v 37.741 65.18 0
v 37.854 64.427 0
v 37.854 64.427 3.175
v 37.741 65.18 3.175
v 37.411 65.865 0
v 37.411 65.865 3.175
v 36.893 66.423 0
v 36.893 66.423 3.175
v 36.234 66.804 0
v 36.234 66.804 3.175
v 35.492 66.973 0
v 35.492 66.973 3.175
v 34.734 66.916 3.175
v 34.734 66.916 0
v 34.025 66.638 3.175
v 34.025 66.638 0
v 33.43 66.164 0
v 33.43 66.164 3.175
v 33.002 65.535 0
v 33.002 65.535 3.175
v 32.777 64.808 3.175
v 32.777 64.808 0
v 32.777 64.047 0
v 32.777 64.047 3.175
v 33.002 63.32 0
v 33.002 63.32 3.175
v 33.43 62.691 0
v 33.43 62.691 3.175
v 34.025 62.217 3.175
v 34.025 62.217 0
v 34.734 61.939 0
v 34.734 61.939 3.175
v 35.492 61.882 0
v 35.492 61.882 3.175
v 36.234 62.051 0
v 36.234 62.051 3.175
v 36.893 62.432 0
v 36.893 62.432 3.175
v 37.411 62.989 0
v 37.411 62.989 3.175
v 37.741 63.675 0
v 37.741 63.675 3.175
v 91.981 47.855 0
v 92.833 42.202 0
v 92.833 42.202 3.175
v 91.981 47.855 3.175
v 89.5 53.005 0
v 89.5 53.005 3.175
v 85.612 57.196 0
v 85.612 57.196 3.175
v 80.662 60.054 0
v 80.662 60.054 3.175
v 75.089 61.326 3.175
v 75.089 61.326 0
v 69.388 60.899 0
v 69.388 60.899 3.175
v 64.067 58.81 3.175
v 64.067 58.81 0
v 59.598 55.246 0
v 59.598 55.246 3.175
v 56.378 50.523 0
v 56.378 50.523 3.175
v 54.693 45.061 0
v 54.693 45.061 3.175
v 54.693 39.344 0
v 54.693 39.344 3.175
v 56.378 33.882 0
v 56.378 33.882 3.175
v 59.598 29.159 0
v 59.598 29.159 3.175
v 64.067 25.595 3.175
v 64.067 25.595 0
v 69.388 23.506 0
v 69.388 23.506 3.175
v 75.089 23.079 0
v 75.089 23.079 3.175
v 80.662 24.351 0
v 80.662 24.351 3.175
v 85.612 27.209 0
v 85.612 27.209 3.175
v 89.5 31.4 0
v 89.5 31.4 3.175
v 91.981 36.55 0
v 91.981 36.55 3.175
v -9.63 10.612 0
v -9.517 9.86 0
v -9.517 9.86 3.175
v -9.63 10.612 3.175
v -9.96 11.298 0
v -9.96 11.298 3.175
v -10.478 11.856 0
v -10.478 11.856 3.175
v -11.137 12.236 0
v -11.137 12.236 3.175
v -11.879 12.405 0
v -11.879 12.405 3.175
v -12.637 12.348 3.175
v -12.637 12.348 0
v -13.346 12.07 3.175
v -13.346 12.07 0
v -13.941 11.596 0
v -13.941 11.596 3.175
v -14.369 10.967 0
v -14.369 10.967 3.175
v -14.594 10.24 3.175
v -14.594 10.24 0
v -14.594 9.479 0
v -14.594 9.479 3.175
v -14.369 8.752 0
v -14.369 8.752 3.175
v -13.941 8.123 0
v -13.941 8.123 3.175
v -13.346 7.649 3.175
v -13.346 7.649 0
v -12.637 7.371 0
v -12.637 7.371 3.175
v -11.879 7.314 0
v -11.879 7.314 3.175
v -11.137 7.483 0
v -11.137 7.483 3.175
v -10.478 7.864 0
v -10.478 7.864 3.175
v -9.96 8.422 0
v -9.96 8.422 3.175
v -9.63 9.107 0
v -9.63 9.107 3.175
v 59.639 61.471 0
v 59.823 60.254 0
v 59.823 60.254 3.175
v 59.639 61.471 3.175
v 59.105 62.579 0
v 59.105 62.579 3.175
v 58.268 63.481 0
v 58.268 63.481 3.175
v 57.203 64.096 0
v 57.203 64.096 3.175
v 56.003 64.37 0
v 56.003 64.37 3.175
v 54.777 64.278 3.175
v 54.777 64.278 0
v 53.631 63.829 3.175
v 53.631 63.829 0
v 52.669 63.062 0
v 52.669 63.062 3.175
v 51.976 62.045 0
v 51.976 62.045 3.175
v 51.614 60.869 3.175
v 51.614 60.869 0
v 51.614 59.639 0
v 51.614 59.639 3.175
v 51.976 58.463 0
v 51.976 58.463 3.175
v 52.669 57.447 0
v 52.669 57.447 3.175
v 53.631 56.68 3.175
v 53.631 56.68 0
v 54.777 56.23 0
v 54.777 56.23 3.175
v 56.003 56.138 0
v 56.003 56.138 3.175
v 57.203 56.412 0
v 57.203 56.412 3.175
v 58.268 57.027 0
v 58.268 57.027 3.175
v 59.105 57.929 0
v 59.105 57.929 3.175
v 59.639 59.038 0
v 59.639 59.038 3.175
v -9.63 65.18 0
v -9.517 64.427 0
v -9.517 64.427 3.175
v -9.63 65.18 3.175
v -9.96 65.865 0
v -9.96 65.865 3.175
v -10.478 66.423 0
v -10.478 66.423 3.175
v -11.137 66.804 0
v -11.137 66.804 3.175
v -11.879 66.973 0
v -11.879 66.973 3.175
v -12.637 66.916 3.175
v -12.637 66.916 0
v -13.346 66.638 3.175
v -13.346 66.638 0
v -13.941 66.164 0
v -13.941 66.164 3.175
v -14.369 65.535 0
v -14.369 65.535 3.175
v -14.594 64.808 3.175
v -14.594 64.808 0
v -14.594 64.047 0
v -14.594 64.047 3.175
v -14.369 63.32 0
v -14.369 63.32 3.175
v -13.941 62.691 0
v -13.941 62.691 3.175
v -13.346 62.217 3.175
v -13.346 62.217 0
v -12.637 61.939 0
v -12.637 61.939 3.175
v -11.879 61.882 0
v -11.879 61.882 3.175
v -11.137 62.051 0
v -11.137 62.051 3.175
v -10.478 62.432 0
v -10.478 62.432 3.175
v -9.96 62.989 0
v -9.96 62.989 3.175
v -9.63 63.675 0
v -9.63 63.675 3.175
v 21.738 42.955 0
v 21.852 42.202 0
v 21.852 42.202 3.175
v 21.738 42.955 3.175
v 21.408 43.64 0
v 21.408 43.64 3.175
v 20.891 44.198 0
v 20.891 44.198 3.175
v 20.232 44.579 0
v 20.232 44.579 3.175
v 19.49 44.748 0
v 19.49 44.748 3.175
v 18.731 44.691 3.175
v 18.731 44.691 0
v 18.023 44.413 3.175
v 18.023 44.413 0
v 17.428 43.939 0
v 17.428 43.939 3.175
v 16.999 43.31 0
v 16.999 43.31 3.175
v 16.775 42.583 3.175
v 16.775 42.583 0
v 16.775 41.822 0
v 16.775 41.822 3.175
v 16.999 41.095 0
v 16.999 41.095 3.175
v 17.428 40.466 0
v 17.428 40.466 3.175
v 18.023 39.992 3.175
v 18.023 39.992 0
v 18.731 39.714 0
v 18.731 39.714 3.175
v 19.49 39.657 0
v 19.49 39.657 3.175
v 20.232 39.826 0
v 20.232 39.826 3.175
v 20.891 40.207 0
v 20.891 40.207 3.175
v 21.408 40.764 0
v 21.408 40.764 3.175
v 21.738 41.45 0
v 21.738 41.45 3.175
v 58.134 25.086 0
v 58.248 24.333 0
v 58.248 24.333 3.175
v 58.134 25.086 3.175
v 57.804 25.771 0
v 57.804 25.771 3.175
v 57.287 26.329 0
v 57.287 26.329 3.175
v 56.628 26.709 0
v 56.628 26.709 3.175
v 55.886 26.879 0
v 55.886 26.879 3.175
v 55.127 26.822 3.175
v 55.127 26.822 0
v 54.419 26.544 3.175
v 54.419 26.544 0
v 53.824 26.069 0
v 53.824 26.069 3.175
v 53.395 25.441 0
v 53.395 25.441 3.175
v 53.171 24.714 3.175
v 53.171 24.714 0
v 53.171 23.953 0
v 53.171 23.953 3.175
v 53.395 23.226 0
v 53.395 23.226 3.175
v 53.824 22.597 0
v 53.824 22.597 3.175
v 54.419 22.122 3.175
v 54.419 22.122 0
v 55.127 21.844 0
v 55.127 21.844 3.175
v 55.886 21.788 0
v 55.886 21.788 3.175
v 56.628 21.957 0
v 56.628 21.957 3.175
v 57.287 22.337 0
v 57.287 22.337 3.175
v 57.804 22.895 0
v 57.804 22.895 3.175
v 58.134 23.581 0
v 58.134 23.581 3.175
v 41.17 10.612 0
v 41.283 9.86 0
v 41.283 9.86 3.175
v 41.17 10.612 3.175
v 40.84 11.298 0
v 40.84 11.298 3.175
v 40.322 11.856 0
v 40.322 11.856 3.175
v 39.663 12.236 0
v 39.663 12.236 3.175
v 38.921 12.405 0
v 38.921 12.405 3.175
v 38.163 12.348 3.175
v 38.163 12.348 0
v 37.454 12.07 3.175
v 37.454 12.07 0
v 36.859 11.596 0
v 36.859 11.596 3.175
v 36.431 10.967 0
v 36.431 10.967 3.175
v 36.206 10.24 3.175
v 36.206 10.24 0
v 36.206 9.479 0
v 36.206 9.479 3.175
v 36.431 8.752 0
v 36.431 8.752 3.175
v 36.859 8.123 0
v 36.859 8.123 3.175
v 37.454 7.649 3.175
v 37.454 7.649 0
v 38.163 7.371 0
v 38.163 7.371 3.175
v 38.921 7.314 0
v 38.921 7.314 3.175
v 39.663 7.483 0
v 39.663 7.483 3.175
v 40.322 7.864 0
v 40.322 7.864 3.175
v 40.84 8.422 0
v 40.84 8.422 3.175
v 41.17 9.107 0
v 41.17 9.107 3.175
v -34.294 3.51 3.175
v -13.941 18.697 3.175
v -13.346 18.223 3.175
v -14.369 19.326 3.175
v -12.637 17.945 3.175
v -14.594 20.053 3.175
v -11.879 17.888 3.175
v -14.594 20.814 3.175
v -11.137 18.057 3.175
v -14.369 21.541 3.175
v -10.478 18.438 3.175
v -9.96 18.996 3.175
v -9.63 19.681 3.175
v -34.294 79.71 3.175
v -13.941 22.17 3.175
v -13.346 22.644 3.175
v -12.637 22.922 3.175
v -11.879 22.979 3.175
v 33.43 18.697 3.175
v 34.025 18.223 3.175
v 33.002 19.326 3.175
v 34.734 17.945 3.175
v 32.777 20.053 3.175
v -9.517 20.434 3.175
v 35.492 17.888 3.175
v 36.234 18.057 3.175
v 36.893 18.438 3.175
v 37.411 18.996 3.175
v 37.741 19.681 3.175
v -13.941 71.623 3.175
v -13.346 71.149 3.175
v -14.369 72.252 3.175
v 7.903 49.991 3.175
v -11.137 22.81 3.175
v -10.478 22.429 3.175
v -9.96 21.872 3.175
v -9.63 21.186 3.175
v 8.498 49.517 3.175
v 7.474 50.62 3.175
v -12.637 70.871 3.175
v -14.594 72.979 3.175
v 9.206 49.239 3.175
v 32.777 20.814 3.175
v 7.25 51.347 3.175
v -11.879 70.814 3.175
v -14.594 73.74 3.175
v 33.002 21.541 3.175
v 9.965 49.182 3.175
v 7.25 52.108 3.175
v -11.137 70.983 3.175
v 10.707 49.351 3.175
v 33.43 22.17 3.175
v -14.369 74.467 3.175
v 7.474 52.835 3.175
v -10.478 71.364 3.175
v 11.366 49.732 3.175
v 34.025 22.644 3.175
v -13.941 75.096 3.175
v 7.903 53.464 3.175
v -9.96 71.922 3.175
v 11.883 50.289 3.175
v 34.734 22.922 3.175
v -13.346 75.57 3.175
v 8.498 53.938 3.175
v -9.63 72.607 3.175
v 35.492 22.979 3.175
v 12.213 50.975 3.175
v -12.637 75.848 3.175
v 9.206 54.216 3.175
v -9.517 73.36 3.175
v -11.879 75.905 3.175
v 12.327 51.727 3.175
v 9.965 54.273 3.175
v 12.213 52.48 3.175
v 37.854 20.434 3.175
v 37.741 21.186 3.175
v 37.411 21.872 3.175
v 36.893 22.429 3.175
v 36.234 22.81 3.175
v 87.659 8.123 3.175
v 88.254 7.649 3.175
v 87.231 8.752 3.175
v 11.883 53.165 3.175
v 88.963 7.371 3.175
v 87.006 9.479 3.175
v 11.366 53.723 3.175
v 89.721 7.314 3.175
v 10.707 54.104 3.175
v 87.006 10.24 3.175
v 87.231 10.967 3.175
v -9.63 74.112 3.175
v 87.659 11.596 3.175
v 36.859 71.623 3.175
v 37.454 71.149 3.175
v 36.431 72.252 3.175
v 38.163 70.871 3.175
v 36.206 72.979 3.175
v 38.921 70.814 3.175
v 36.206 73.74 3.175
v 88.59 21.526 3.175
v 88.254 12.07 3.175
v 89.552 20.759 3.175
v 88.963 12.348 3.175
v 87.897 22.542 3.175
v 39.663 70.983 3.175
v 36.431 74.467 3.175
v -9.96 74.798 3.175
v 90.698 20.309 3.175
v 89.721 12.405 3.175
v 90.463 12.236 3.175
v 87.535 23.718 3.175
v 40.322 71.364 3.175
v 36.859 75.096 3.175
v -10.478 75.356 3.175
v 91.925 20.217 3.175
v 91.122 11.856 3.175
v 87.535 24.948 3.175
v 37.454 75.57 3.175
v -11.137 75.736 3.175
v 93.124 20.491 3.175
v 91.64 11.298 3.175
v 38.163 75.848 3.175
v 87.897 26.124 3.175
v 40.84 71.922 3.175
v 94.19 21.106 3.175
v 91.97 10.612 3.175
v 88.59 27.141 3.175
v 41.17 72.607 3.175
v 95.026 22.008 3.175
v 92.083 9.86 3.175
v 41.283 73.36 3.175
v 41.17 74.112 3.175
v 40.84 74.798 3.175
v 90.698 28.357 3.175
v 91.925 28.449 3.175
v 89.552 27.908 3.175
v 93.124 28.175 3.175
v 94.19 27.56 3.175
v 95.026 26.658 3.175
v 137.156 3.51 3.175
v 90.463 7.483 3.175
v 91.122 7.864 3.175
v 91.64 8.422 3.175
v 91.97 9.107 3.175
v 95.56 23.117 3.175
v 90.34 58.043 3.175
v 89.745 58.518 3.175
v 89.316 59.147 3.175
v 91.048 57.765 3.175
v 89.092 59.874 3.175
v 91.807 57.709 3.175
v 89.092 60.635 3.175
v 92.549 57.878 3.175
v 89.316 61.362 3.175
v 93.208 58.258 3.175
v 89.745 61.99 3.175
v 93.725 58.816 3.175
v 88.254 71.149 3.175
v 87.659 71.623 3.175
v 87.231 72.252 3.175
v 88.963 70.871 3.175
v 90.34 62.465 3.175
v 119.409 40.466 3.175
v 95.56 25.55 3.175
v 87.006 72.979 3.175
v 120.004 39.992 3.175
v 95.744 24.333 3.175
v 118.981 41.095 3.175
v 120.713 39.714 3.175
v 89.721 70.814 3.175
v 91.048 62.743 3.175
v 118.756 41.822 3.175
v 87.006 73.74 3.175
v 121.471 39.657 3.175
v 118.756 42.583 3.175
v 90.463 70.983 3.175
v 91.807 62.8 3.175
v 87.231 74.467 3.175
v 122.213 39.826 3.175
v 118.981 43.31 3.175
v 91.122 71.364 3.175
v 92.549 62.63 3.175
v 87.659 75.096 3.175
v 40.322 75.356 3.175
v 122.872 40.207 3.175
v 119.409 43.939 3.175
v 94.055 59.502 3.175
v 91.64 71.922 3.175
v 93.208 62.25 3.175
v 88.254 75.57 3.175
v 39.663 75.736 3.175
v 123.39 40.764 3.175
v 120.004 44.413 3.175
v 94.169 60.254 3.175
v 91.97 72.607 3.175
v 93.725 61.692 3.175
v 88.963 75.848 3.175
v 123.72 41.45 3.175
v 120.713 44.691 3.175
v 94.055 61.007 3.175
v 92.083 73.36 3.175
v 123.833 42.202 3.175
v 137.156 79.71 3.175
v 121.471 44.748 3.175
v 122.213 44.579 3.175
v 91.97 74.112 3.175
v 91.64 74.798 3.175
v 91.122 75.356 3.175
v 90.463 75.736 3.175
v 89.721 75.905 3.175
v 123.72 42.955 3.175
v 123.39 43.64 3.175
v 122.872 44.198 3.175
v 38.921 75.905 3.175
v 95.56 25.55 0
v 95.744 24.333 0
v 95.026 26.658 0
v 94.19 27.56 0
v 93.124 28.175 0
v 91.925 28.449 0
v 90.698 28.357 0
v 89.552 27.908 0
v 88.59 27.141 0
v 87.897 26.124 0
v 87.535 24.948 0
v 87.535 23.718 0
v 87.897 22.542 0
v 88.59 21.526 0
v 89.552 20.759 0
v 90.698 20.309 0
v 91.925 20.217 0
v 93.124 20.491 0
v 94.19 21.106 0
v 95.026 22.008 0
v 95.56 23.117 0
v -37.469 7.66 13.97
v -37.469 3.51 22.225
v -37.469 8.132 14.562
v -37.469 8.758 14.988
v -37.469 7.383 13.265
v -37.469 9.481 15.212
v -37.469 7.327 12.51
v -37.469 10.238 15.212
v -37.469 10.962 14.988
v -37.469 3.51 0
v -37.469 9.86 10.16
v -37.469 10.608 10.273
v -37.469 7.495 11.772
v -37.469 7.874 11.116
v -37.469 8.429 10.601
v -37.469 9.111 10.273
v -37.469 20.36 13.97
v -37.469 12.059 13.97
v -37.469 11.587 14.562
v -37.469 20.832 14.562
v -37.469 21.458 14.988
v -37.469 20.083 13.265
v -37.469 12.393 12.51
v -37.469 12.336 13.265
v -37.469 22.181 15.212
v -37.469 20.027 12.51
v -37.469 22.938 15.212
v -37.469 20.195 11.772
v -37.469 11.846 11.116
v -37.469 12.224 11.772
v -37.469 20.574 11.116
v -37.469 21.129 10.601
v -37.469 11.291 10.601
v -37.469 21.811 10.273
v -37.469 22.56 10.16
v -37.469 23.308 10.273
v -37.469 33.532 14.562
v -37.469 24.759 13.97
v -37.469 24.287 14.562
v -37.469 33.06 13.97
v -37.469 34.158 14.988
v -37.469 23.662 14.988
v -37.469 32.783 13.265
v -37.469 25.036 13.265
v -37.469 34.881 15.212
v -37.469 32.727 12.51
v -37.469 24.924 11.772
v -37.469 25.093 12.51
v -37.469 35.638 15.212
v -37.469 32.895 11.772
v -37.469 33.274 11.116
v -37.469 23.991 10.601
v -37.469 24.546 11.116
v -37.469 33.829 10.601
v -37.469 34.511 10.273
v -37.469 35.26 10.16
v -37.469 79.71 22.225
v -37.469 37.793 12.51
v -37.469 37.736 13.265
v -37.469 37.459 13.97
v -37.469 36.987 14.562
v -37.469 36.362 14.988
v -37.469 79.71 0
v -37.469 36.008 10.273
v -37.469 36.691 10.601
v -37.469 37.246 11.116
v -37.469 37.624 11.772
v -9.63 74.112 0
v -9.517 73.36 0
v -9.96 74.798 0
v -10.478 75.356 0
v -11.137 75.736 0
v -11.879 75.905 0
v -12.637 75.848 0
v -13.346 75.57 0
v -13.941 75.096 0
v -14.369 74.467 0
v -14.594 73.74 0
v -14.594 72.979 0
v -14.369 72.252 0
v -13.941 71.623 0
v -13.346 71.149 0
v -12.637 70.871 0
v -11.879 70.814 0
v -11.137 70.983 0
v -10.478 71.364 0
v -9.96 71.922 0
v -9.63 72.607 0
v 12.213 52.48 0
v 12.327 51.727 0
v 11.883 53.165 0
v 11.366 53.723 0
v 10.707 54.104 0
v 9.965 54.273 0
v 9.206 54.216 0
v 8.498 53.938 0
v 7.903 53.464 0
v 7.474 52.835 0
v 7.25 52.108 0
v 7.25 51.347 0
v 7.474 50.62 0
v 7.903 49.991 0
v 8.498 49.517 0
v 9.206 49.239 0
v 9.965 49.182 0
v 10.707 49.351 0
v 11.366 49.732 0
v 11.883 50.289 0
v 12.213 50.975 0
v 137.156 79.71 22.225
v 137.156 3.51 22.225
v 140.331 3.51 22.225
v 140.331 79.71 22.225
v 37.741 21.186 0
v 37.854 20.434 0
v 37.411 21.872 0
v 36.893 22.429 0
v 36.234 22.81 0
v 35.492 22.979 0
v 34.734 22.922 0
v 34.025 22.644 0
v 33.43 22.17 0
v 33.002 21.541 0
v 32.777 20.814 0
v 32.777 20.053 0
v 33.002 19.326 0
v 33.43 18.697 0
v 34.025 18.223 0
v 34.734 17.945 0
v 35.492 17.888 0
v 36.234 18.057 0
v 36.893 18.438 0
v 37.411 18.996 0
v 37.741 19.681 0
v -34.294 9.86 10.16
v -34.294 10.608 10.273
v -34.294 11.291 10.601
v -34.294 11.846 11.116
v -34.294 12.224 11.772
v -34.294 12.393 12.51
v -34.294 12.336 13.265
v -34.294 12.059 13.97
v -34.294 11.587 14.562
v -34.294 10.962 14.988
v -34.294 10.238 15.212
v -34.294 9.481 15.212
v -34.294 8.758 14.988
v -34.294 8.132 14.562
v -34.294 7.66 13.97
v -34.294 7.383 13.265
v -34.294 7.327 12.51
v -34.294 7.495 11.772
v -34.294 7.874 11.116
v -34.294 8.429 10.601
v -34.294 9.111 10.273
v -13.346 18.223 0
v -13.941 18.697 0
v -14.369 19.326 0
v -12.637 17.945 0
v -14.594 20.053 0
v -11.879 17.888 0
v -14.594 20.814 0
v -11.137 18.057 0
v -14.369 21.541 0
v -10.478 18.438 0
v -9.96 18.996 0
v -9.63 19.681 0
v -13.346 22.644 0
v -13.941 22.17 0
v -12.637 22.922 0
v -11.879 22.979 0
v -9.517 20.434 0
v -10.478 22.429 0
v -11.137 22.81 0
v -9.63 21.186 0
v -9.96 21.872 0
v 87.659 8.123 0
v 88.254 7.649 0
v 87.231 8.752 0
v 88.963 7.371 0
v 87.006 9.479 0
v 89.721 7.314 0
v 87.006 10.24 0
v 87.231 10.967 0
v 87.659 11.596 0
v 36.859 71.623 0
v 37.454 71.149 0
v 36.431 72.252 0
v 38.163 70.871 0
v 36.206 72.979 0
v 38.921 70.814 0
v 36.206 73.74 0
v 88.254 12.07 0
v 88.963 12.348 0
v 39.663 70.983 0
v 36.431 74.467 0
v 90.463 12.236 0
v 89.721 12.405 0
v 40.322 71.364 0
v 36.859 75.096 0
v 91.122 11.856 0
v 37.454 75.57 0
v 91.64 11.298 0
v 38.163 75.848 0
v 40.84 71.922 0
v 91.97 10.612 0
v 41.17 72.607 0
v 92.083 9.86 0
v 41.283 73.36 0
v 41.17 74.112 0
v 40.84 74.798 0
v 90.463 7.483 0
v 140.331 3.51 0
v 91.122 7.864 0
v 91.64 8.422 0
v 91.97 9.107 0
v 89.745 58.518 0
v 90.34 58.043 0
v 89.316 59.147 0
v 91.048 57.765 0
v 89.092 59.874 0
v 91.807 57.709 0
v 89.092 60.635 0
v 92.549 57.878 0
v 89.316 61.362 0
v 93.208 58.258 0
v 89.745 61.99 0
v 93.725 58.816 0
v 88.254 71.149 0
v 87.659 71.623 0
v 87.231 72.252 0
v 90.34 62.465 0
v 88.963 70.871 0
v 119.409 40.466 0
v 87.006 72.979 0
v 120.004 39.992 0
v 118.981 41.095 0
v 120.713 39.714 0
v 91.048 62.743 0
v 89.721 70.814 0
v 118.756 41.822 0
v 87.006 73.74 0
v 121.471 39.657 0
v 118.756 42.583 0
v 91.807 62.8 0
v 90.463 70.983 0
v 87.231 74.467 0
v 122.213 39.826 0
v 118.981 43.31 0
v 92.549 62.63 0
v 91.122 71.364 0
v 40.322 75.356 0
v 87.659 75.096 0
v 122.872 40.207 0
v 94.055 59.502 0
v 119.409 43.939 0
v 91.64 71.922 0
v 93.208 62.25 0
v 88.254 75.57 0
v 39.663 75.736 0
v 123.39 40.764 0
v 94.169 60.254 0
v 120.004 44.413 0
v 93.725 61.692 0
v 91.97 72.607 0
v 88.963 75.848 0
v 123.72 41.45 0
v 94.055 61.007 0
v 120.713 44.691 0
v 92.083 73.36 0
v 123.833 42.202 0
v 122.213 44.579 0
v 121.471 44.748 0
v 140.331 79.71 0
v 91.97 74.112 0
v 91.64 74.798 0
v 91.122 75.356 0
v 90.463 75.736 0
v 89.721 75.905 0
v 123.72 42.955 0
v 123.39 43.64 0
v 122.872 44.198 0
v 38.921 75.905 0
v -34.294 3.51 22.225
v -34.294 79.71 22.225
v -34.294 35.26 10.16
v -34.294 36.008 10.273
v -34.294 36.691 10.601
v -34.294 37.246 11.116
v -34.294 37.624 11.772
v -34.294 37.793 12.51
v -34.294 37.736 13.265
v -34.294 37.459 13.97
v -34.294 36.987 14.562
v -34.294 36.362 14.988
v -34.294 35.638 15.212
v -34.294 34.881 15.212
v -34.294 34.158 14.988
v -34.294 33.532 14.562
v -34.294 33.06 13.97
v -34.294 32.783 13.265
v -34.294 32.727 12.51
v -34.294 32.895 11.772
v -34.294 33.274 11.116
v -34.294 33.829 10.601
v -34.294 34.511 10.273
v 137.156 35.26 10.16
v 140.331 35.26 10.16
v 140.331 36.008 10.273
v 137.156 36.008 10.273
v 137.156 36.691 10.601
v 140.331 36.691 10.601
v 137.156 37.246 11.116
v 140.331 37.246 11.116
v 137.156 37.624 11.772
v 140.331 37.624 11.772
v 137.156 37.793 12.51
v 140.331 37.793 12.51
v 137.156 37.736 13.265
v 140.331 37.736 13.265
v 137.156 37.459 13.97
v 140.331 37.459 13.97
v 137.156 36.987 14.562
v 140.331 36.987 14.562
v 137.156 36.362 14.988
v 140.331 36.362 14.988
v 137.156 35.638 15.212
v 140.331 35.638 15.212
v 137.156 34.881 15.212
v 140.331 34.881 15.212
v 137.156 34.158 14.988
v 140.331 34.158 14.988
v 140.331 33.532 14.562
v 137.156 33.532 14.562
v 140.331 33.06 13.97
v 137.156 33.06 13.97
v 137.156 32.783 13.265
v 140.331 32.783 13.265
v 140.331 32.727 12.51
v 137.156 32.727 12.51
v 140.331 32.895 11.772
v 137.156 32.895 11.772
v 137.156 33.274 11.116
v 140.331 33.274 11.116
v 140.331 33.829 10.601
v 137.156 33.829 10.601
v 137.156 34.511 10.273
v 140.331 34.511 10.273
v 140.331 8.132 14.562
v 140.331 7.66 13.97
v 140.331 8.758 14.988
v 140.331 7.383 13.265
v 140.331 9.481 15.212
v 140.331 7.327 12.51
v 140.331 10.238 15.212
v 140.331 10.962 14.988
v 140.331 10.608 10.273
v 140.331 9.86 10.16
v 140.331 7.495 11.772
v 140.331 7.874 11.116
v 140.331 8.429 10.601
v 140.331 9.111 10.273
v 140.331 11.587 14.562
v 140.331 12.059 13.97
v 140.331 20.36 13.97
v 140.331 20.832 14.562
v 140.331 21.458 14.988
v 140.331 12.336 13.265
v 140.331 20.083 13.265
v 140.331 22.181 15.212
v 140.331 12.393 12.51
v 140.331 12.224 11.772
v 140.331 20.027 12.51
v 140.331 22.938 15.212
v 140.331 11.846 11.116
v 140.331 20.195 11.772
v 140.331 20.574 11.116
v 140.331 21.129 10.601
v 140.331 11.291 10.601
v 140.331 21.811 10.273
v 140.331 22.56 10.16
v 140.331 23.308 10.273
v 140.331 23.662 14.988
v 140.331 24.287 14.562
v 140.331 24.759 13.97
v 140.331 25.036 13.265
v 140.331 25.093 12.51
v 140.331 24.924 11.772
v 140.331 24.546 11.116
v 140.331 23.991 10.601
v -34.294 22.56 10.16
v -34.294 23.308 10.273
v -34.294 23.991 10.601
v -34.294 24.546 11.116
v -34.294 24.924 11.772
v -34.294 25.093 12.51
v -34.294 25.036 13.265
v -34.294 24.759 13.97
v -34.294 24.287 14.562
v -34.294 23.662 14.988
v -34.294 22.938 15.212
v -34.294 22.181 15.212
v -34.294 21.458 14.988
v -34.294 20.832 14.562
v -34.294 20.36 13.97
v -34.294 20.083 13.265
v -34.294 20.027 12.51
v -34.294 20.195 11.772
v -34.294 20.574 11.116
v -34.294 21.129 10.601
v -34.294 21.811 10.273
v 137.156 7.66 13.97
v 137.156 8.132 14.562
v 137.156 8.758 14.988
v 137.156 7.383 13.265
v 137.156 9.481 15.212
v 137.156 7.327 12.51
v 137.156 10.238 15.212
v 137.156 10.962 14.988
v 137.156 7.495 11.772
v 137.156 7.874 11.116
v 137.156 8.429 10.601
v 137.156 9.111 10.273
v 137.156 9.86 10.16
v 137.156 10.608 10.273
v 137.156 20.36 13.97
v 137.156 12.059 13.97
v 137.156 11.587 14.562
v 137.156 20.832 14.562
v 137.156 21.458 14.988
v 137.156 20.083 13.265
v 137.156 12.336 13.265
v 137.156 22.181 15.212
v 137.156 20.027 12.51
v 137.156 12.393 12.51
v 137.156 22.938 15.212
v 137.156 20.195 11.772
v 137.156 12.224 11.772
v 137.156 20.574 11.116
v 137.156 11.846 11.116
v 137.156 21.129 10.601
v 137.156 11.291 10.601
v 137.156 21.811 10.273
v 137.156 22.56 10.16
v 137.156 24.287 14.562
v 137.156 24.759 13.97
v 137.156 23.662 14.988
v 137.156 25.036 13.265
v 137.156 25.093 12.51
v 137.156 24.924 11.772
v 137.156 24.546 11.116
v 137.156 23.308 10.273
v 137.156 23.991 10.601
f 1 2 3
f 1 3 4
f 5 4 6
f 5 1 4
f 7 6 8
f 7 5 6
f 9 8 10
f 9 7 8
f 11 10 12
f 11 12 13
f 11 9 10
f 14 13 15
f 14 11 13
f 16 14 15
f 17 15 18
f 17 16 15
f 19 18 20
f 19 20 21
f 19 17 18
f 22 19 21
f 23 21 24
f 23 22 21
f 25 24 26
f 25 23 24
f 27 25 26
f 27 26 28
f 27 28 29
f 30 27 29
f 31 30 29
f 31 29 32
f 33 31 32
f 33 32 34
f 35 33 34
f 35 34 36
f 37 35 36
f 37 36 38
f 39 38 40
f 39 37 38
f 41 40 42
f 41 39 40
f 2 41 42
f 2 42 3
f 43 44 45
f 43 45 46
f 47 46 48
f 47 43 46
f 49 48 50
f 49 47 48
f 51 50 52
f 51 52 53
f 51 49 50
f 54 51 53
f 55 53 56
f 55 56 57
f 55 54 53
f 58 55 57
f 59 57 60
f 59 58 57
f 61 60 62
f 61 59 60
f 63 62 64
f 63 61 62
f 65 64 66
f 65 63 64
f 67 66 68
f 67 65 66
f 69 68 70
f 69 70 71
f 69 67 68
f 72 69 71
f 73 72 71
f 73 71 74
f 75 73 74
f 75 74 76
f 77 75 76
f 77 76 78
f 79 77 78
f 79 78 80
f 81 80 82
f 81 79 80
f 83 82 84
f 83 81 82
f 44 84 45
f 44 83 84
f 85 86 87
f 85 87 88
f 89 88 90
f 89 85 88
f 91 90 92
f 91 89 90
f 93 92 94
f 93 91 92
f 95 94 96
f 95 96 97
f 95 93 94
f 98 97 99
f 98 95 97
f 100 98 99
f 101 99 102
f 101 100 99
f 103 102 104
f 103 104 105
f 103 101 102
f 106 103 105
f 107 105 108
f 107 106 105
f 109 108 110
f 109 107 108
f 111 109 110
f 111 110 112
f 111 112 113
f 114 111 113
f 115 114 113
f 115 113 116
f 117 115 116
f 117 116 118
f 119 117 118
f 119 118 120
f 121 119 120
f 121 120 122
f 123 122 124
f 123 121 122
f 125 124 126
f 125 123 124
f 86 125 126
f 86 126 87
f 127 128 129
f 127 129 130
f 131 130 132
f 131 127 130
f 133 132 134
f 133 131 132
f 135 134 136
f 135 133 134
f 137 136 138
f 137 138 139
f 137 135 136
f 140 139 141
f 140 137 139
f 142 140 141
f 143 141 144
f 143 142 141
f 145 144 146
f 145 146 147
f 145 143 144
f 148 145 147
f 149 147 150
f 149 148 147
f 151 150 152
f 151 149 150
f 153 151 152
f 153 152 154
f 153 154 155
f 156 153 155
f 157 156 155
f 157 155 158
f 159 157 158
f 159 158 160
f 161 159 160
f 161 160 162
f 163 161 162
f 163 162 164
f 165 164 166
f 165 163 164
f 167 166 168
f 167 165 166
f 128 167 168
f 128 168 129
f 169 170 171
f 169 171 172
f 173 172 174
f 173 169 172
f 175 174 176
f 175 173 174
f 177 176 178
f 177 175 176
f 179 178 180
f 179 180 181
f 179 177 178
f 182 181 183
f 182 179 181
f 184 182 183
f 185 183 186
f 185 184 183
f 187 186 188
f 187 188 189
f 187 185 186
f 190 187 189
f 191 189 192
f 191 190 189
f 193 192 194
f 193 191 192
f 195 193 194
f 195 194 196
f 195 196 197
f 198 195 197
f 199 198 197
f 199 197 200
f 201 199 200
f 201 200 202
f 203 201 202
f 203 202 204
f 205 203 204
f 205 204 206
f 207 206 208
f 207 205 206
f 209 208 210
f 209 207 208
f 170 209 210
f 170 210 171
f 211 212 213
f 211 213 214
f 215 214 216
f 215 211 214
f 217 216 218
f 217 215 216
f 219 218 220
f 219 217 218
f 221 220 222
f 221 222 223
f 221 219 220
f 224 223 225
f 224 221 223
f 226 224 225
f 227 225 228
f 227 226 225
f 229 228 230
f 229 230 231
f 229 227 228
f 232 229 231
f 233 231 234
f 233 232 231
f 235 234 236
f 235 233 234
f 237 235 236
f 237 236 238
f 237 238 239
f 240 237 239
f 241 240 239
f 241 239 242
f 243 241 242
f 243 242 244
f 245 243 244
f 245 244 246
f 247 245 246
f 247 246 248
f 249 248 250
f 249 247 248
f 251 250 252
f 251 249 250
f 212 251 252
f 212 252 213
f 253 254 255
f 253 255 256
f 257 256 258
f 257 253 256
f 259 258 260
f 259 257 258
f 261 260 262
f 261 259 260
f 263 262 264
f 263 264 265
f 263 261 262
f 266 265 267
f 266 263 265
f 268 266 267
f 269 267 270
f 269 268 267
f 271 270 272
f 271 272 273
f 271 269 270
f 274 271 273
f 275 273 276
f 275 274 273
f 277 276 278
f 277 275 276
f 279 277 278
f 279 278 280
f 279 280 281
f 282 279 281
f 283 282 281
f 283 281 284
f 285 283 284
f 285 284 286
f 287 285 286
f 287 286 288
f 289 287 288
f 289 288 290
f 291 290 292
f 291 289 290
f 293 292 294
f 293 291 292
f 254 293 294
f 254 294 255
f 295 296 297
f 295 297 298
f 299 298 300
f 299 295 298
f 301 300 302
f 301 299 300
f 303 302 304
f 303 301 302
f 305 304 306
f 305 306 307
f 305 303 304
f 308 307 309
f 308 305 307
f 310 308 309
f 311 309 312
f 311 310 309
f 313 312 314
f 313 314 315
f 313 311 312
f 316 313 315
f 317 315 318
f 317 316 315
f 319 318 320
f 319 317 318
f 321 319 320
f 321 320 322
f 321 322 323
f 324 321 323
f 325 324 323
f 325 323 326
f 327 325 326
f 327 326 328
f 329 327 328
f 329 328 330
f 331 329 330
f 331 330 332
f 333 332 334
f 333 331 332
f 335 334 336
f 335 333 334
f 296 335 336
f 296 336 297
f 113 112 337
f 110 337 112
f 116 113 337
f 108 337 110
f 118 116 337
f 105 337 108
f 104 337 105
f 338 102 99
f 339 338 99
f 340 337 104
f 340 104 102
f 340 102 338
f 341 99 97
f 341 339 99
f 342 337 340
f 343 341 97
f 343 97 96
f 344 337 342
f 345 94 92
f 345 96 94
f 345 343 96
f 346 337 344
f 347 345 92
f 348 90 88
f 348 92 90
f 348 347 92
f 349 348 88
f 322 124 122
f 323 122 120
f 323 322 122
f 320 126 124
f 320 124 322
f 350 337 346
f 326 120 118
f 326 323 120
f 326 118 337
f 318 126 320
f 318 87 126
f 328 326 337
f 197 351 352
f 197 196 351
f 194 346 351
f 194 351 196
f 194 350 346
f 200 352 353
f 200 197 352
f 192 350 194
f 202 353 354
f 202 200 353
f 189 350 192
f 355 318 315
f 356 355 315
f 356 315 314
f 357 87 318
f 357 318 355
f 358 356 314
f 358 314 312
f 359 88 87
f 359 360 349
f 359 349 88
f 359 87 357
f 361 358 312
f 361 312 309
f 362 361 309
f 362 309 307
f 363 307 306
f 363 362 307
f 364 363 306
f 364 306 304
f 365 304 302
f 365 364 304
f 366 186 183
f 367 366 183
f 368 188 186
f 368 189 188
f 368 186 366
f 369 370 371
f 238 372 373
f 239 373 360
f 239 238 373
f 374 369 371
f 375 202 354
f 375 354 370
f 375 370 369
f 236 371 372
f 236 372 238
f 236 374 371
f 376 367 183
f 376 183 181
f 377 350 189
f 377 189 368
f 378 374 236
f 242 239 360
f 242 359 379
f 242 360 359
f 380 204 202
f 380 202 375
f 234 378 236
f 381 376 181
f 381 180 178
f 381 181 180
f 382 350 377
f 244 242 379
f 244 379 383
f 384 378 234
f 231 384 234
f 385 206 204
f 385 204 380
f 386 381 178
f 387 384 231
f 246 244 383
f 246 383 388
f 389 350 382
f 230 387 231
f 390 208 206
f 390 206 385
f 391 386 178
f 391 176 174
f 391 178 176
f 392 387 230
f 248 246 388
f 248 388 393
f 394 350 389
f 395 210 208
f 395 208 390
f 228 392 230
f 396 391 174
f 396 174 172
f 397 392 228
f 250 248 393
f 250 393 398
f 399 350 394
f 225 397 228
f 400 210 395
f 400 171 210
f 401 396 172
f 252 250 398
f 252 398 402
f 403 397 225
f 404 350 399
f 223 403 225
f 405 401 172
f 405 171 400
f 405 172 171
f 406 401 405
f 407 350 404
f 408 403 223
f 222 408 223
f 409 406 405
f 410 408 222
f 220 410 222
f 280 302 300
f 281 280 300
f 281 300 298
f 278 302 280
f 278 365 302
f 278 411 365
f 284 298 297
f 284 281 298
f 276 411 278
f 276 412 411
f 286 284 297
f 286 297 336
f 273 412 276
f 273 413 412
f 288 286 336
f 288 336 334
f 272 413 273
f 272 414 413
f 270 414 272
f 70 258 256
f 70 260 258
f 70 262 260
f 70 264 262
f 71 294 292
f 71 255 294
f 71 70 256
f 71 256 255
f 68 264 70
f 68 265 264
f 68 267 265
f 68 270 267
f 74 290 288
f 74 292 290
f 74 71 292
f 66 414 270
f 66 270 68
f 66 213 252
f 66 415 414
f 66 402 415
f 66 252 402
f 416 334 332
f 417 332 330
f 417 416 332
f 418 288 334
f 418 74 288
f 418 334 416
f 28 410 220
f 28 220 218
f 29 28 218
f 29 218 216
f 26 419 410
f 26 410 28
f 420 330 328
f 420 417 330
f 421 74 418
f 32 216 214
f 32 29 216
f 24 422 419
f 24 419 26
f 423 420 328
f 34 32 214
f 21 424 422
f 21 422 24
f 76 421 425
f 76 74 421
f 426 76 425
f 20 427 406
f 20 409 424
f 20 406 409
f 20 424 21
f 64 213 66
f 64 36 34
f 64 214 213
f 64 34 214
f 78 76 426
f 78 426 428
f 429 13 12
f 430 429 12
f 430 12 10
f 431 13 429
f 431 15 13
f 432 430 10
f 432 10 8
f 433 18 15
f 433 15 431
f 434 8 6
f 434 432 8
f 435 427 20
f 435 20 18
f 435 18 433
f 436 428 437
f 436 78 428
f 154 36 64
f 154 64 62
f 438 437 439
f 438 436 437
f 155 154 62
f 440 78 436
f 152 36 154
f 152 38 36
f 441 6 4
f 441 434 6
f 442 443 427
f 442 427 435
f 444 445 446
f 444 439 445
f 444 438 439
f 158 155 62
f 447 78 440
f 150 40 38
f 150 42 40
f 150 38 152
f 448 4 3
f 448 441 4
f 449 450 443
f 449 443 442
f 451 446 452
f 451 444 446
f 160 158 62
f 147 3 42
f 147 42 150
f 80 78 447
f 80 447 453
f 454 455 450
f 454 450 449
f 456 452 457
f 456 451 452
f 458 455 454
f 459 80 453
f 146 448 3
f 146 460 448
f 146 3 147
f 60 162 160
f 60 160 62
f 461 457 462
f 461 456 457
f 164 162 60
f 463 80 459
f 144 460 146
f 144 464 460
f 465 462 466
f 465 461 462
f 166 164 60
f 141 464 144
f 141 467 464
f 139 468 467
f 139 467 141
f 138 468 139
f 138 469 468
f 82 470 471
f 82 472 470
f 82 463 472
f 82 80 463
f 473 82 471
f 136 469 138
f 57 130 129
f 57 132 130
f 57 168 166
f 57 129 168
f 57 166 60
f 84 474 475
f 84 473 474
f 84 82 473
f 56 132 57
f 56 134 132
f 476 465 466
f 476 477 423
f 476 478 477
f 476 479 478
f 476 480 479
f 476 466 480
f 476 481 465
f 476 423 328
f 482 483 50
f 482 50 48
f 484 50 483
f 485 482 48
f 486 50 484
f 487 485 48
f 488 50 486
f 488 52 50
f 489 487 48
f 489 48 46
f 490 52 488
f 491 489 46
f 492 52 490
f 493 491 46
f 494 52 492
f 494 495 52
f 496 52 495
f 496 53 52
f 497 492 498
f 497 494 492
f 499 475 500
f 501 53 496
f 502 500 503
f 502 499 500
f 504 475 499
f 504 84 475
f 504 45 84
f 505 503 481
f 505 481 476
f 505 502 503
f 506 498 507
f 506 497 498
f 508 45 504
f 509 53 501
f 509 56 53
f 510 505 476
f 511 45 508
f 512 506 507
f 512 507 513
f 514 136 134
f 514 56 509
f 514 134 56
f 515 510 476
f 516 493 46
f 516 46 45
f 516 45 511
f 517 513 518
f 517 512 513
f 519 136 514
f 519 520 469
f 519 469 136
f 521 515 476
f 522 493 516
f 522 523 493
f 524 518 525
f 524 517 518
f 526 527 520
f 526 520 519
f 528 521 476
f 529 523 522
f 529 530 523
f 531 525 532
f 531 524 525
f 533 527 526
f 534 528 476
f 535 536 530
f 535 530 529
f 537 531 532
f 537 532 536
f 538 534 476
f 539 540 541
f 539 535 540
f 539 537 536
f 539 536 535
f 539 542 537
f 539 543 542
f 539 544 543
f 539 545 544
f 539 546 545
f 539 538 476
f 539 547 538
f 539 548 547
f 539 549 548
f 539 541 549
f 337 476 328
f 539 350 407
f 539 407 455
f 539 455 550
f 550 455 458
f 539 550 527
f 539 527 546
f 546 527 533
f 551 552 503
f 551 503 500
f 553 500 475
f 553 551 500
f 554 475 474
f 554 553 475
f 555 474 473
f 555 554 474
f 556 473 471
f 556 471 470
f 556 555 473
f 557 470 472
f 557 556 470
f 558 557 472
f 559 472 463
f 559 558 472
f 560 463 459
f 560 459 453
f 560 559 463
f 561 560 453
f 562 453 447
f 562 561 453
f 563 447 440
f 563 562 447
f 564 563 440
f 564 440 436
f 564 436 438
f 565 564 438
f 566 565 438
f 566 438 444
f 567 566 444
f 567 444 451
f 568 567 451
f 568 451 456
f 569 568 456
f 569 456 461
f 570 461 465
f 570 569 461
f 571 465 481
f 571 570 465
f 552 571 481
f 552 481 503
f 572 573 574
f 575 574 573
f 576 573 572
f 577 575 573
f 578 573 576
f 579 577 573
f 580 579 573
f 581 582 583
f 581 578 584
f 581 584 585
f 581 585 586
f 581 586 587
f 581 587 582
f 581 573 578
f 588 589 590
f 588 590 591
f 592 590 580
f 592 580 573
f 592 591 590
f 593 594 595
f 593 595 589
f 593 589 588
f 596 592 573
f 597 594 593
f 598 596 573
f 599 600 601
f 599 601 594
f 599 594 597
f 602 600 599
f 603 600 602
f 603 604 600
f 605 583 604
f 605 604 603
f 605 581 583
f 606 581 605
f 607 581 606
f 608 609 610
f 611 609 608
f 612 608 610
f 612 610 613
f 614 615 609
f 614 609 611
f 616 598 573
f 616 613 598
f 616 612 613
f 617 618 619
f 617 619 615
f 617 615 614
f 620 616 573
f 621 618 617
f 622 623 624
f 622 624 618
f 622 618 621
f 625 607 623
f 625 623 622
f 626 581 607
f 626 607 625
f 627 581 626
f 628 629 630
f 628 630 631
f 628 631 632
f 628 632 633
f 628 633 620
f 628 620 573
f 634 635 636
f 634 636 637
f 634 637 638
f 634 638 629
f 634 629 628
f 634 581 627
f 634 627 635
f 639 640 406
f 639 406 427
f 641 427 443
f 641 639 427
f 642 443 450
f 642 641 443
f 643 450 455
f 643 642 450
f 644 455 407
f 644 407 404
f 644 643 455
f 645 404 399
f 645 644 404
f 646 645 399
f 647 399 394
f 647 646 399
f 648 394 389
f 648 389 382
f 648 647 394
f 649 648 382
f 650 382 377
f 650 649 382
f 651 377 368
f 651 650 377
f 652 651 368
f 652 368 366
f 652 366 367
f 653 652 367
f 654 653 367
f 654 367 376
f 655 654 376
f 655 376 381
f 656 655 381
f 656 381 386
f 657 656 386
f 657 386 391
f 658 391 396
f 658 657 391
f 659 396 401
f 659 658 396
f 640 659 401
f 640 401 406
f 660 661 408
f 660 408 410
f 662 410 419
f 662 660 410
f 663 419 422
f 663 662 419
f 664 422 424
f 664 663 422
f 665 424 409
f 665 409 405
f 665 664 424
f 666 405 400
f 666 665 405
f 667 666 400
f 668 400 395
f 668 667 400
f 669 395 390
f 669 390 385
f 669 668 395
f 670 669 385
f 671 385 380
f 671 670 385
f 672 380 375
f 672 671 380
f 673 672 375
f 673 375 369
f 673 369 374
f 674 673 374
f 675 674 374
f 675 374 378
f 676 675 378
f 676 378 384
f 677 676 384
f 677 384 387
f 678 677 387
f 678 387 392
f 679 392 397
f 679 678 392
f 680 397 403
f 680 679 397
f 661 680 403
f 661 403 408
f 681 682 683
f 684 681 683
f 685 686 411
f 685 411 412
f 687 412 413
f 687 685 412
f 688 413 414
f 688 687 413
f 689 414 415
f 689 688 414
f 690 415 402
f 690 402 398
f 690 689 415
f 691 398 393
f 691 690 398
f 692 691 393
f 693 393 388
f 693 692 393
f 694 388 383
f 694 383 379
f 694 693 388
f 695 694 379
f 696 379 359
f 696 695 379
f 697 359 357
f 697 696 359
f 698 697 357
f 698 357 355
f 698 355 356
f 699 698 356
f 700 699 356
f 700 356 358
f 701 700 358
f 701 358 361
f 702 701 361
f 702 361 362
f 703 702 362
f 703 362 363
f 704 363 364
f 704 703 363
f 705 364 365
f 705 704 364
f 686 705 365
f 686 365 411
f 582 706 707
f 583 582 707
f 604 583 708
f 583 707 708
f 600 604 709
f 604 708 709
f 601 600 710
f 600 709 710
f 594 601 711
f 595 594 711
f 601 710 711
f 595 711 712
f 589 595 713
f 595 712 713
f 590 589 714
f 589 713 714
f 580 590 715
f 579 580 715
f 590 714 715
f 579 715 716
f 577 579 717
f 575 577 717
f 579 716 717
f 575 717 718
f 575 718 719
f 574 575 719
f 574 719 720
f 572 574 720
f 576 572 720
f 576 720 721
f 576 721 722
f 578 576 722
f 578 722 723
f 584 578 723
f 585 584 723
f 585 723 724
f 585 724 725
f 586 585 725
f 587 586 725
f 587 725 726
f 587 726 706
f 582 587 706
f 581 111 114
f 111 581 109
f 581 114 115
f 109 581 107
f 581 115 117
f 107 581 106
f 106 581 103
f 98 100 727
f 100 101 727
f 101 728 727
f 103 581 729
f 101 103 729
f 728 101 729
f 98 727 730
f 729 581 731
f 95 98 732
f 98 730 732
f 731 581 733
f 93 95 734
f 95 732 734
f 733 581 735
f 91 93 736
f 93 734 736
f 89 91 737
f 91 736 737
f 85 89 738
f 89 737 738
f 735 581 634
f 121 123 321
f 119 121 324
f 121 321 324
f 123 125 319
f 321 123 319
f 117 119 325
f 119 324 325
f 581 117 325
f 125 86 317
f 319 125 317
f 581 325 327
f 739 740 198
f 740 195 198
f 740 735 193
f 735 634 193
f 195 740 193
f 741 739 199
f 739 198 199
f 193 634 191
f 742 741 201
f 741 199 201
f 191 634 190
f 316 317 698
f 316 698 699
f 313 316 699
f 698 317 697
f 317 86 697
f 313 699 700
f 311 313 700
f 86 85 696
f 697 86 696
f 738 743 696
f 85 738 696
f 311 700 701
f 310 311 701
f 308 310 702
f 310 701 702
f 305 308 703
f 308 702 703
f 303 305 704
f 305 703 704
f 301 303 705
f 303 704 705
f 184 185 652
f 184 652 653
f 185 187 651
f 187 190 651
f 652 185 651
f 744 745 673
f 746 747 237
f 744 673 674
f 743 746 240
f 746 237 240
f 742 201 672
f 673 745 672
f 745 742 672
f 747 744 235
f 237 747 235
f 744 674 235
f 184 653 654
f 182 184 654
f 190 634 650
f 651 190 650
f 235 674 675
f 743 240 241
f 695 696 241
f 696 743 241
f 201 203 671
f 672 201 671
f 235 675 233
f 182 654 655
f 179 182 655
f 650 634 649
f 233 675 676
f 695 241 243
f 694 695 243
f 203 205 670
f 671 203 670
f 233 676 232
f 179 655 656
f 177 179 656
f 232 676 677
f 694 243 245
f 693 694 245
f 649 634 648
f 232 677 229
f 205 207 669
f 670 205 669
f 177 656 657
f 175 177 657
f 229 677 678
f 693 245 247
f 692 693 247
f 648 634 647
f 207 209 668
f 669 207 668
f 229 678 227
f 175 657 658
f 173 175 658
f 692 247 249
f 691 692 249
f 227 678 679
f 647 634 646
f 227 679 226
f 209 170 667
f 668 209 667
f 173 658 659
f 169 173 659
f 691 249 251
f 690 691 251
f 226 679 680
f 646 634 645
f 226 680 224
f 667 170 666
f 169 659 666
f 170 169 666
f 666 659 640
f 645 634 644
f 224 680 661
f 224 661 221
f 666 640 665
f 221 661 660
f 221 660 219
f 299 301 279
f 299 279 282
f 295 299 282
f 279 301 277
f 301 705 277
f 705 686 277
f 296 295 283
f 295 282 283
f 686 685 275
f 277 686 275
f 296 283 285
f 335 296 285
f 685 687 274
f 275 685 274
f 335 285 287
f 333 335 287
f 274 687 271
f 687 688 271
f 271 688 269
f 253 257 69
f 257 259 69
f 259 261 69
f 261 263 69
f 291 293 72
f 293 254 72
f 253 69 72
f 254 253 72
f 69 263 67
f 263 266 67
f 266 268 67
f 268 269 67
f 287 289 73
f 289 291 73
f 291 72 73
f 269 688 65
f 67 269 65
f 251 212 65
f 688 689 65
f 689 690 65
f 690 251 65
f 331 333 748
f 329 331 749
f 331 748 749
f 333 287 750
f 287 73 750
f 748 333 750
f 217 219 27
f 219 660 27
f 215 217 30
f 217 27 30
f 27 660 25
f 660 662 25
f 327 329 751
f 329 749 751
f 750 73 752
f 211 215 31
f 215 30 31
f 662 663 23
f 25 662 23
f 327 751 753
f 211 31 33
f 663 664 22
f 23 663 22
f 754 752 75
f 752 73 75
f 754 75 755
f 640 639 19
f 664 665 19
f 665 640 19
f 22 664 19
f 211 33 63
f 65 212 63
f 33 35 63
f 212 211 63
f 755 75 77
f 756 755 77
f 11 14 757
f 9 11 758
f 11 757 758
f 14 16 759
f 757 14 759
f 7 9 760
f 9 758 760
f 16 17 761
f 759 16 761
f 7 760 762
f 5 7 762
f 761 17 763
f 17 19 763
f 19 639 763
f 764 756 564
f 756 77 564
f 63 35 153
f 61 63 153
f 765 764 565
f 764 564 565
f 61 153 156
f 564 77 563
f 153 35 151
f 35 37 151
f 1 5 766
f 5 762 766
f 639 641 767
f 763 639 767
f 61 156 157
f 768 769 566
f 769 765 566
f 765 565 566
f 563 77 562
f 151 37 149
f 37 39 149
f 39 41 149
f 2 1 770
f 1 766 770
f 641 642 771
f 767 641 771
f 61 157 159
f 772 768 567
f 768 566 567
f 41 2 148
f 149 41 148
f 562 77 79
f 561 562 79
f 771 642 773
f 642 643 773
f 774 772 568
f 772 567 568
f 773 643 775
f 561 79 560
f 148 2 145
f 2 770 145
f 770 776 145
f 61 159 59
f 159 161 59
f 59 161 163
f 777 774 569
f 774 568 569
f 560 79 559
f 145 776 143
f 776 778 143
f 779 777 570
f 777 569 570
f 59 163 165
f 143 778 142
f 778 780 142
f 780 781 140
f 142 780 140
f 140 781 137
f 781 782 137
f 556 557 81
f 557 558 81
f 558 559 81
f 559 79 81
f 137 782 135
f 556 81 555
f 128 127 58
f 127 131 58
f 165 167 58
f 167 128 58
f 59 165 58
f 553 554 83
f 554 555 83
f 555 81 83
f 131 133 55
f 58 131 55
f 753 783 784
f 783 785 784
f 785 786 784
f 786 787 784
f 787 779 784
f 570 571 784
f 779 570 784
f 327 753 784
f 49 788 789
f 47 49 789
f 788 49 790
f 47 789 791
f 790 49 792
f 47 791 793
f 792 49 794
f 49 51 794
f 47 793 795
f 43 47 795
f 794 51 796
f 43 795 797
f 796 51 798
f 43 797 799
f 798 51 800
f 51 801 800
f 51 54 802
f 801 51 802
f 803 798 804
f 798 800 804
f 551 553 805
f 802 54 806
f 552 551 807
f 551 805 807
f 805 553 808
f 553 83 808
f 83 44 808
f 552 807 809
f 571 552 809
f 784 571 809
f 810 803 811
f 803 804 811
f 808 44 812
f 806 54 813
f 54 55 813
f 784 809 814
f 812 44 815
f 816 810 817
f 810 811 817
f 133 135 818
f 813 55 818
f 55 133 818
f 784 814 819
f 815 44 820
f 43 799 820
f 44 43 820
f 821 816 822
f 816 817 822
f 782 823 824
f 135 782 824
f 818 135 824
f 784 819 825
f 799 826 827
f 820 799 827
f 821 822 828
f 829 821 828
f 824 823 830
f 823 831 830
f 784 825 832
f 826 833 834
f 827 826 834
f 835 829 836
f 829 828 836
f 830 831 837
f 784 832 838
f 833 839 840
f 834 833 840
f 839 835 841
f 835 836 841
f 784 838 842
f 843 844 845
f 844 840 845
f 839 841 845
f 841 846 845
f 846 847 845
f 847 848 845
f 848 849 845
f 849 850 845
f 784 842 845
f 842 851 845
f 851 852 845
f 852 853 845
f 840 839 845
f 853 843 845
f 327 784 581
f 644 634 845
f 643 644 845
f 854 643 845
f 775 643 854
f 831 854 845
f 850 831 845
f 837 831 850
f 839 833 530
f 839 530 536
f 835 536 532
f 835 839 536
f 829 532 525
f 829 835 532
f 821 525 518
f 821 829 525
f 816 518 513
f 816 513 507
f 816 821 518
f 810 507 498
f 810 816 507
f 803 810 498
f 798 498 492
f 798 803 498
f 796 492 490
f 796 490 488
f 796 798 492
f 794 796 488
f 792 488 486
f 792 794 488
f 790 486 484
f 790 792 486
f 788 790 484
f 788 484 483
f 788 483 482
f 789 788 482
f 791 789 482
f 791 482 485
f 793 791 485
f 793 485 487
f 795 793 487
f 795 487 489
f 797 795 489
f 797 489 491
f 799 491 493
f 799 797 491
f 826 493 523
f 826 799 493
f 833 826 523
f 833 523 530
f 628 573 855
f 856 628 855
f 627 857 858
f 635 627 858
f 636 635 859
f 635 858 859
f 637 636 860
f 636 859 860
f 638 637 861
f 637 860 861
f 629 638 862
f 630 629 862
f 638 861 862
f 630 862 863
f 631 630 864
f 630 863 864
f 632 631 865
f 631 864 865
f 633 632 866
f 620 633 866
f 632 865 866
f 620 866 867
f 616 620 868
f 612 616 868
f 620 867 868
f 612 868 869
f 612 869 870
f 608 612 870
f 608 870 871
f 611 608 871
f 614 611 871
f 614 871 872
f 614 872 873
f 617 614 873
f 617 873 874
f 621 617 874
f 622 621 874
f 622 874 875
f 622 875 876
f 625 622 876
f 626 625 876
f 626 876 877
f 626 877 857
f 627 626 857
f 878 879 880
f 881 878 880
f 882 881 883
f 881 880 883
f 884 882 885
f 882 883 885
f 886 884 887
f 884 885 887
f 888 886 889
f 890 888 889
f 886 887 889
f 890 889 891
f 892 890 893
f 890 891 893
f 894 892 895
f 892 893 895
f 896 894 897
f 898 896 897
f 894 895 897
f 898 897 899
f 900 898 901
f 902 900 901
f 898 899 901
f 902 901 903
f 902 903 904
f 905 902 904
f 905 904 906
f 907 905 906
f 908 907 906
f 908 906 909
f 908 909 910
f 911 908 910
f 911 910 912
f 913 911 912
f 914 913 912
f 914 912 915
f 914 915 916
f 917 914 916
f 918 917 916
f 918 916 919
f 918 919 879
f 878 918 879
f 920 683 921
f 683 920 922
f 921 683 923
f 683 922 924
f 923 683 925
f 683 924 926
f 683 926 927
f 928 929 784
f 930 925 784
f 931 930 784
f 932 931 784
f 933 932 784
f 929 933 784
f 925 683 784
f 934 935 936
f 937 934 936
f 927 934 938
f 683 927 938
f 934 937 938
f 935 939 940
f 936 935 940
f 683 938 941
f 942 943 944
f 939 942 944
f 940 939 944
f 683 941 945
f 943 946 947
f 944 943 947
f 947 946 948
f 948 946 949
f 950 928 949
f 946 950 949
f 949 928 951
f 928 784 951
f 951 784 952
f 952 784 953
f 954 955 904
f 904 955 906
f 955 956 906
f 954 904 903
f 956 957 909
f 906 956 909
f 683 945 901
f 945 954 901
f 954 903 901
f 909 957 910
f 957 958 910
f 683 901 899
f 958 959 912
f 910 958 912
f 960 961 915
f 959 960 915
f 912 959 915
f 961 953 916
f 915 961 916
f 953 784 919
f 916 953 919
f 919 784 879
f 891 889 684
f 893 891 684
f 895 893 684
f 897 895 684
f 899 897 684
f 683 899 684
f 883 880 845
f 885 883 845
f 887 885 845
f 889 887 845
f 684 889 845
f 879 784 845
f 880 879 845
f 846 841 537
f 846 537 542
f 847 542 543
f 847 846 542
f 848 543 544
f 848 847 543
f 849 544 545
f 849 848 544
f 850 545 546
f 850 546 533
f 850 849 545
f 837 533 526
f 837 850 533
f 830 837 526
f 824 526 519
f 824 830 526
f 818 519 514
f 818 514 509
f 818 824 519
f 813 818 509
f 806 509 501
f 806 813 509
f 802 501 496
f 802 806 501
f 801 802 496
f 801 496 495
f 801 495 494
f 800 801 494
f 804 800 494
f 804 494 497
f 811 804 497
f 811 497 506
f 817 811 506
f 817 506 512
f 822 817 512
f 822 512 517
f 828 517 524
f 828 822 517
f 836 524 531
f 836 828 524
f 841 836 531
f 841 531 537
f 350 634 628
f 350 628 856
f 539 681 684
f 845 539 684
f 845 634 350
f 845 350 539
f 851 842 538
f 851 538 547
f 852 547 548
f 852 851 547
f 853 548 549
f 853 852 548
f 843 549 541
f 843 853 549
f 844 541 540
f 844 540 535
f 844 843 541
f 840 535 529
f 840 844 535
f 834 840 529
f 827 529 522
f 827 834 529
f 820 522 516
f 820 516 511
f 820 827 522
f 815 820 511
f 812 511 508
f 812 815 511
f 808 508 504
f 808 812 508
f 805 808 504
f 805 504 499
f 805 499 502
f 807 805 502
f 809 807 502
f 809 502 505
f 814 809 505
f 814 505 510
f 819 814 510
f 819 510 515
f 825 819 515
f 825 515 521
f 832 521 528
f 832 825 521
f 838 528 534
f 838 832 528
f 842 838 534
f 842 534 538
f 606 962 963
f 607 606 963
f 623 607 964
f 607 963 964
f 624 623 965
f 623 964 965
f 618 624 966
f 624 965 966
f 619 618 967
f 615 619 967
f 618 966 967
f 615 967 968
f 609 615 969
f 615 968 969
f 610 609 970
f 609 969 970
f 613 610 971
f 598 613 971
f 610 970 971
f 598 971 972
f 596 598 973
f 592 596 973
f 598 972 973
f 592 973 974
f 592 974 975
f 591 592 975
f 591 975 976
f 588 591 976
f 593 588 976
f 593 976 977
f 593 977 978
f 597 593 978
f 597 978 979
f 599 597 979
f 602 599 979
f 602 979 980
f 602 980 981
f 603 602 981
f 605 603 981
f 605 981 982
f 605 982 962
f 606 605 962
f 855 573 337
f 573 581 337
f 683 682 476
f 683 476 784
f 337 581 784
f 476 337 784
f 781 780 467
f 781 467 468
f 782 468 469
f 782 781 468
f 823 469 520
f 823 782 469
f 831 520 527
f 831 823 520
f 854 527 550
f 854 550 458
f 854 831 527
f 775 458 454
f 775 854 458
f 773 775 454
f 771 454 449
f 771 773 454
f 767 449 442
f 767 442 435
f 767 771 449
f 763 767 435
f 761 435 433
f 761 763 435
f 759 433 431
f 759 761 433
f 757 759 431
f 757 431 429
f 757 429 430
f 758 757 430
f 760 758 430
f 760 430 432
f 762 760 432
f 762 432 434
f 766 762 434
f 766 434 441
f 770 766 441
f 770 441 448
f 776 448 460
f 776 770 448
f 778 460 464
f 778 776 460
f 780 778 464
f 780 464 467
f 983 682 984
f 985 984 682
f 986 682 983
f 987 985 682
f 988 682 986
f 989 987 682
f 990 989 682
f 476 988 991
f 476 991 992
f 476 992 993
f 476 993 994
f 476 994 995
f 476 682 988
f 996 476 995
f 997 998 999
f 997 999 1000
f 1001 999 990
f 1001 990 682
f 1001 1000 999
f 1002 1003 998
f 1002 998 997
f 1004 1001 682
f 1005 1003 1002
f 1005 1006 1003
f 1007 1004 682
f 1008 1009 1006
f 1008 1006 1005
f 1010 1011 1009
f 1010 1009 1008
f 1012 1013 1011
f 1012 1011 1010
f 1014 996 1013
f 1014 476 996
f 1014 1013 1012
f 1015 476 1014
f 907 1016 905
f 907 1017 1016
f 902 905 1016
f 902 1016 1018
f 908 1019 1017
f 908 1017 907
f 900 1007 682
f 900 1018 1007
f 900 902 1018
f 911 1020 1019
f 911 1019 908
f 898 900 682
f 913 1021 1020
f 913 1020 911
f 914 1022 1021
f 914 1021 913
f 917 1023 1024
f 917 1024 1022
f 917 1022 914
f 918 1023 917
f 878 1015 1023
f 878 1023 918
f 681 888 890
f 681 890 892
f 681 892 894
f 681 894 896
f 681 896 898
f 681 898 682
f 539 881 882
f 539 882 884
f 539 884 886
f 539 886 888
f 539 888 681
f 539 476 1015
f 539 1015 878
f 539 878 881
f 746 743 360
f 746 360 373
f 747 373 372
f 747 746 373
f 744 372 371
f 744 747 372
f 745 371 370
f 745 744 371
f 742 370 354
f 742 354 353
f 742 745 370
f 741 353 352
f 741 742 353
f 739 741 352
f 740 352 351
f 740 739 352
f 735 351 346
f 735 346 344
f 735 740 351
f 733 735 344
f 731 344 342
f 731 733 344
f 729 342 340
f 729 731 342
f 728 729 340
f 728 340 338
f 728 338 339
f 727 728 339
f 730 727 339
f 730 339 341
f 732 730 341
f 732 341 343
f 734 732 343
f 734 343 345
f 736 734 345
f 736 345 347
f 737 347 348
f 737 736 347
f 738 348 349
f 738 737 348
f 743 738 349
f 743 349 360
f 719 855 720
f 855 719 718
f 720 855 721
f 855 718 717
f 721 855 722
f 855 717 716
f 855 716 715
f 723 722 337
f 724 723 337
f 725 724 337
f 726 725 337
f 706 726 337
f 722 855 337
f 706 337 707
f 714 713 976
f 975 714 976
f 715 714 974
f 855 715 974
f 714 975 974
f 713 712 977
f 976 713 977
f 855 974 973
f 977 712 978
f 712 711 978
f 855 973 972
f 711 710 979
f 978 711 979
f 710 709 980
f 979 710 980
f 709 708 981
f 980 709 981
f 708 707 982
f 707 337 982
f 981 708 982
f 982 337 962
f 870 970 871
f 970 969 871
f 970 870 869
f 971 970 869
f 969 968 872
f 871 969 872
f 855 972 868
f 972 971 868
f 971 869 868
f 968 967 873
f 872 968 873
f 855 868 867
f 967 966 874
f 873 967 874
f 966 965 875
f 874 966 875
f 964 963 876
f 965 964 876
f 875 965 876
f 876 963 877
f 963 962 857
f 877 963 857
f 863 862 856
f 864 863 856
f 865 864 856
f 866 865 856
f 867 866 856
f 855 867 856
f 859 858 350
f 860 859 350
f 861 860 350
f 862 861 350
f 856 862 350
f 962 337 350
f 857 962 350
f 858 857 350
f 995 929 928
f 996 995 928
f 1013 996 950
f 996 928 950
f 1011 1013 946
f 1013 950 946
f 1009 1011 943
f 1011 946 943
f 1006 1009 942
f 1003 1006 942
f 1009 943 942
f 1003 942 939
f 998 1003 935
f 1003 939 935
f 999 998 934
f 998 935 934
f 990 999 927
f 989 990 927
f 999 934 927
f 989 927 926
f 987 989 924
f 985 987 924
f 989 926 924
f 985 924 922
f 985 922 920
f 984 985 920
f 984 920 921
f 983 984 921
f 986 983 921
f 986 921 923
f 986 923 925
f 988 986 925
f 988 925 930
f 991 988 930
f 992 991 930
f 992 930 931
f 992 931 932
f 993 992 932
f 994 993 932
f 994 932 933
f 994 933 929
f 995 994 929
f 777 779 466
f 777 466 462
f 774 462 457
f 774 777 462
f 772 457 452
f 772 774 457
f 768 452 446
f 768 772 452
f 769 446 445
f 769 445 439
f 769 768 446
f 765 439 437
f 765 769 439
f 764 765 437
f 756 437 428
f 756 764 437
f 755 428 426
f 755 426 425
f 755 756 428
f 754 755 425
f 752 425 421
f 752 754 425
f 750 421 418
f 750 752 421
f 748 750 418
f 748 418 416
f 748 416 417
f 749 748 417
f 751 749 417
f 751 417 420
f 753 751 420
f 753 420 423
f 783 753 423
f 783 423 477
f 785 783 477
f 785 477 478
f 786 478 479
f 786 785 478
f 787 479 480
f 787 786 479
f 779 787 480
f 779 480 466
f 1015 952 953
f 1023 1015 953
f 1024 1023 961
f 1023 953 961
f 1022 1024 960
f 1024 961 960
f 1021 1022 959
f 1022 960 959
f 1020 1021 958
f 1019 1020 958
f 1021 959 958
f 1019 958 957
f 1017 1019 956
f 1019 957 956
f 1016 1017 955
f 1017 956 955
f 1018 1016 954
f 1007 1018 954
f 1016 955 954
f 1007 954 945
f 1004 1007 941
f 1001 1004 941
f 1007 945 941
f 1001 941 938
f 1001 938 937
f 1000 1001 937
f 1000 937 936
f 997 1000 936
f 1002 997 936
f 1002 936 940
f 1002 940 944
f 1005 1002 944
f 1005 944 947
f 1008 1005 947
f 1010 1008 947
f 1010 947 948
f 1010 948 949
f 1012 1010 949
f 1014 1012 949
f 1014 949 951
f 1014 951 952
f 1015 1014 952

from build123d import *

# Parameters (mm, degrees)
SKETCH1_W           = 177.8
SKETCH1_H           = 76.2
SKETCH1_R           = 2.5527
SKETCH1_R_2         = 4.1275
SKETCH1_R_3         = 19.177
BOSS_EXTRUDE1_DEPTH = 3.175
SKETCH2_W           = 3.175
SKETCH2_H           = 76.2
BOSS_EXTRUDE2_DEPTH = 19.05
SKETCH3_R           = 2.54
CUT_EXTRUDE1_DEPTH  = 197.11331534


with BuildPart() as part:
    # Sketch1 → Boss-Extrude1 (new body)
    with BuildSketch(Plane.XY):
        with Locations((51.430541204, 41.609734844)):
            Rectangle(SKETCH1_W, SKETCH1_H)
        with Locations((89.530541204, 9.859734844)):
            Circle(SKETCH1_R, mode=Mode.SUBTRACT)
        with Locations((89.530541204, 73.359734844)):
            Circle(SKETCH1_R, mode=Mode.SUBTRACT)
        with Locations((-12.069458796, 73.359734844)):
            Circle(SKETCH1_R, mode=Mode.SUBTRACT)
        with Locations((-12.069458796, 64.427395008)):
            Circle(SKETCH1_R, mode=Mode.SUBTRACT)
        with Locations((38.730541204, 73.359734844)):
            Circle(SKETCH1_R, mode=Mode.SUBTRACT)
        with Locations((35.301541204, 64.427395008)):
            Circle(SKETCH1_R, mode=Mode.SUBTRACT)
        with Locations((9.774192889, 51.727395008)):
            Circle(SKETCH1_R, mode=Mode.SUBTRACT)
        with Locations((19.299192889, 42.202395008)):
            Circle(SKETCH1_R, mode=Mode.SUBTRACT)
        with Locations((-12.069458796, 20.433674276)):
            Circle(SKETCH1_R, mode=Mode.SUBTRACT)
        with Locations((35.301541204, 20.433674276)):
            Circle(SKETCH1_R, mode=Mode.SUBTRACT)
        with Locations((38.730541204, 9.859734844)):
            Circle(SKETCH1_R, mode=Mode.SUBTRACT)
        with Locations((55.695028962, 24.33315969)):
            Circle(SKETCH1_R, mode=Mode.SUBTRACT)
        with Locations((55.695028962, 60.254184174)):
            Circle(SKETCH1_R_2, mode=Mode.SUBTRACT)
        with Locations((91.616053446, 60.254184174)):
            Circle(SKETCH1_R, mode=Mode.SUBTRACT)
        with Locations((91.616053446, 24.33315969)):
            Circle(SKETCH1_R_2, mode=Mode.SUBTRACT)
        with Locations((73.655541204, 42.202395008)):
            Circle(SKETCH1_R_3, mode=Mode.SUBTRACT)
        with Locations((-12.069458796, 9.859734844)):
            Circle(SKETCH1_R, mode=Mode.SUBTRACT)
        with Locations((121.280541204, 42.202395008)):
            Circle(SKETCH1_R, mode=Mode.SUBTRACT)
    extrude(amount=BOSS_EXTRUDE1_DEPTH)

    # Sketch2 → Boss-Extrude2 (add)
    with BuildSketch(Plane.XY.offset(3.175)):
        with Locations((-35.881958796, 41.609734844)):
            Rectangle(SKETCH2_W, SKETCH2_H)
        with Locations((138.743041204, 41.609734844)):
            Rectangle(SKETCH2_W, SKETCH2_H)
    extrude(amount=BOSS_EXTRUDE2_DEPTH)

    # Sketch3 → Cut-Extrude1 (cut, through all)
    with BuildSketch(Plane(origin=(140.330541204, 0, 0), x_dir=(0, 0, -1), z_dir=(1, 0, 0))):
        with Locations((-12.7, 35.259734844)):
            Circle(SKETCH3_R)
        with Locations((-12.7, 22.559734844)):
            Circle(SKETCH3_R)
        with Locations((-12.7, 9.859734844)):
            Circle(SKETCH3_R)
    extrude(amount=-CUT_EXTRUDE1_DEPTH, mode=Mode.SUBTRACT)


solid = part.part
